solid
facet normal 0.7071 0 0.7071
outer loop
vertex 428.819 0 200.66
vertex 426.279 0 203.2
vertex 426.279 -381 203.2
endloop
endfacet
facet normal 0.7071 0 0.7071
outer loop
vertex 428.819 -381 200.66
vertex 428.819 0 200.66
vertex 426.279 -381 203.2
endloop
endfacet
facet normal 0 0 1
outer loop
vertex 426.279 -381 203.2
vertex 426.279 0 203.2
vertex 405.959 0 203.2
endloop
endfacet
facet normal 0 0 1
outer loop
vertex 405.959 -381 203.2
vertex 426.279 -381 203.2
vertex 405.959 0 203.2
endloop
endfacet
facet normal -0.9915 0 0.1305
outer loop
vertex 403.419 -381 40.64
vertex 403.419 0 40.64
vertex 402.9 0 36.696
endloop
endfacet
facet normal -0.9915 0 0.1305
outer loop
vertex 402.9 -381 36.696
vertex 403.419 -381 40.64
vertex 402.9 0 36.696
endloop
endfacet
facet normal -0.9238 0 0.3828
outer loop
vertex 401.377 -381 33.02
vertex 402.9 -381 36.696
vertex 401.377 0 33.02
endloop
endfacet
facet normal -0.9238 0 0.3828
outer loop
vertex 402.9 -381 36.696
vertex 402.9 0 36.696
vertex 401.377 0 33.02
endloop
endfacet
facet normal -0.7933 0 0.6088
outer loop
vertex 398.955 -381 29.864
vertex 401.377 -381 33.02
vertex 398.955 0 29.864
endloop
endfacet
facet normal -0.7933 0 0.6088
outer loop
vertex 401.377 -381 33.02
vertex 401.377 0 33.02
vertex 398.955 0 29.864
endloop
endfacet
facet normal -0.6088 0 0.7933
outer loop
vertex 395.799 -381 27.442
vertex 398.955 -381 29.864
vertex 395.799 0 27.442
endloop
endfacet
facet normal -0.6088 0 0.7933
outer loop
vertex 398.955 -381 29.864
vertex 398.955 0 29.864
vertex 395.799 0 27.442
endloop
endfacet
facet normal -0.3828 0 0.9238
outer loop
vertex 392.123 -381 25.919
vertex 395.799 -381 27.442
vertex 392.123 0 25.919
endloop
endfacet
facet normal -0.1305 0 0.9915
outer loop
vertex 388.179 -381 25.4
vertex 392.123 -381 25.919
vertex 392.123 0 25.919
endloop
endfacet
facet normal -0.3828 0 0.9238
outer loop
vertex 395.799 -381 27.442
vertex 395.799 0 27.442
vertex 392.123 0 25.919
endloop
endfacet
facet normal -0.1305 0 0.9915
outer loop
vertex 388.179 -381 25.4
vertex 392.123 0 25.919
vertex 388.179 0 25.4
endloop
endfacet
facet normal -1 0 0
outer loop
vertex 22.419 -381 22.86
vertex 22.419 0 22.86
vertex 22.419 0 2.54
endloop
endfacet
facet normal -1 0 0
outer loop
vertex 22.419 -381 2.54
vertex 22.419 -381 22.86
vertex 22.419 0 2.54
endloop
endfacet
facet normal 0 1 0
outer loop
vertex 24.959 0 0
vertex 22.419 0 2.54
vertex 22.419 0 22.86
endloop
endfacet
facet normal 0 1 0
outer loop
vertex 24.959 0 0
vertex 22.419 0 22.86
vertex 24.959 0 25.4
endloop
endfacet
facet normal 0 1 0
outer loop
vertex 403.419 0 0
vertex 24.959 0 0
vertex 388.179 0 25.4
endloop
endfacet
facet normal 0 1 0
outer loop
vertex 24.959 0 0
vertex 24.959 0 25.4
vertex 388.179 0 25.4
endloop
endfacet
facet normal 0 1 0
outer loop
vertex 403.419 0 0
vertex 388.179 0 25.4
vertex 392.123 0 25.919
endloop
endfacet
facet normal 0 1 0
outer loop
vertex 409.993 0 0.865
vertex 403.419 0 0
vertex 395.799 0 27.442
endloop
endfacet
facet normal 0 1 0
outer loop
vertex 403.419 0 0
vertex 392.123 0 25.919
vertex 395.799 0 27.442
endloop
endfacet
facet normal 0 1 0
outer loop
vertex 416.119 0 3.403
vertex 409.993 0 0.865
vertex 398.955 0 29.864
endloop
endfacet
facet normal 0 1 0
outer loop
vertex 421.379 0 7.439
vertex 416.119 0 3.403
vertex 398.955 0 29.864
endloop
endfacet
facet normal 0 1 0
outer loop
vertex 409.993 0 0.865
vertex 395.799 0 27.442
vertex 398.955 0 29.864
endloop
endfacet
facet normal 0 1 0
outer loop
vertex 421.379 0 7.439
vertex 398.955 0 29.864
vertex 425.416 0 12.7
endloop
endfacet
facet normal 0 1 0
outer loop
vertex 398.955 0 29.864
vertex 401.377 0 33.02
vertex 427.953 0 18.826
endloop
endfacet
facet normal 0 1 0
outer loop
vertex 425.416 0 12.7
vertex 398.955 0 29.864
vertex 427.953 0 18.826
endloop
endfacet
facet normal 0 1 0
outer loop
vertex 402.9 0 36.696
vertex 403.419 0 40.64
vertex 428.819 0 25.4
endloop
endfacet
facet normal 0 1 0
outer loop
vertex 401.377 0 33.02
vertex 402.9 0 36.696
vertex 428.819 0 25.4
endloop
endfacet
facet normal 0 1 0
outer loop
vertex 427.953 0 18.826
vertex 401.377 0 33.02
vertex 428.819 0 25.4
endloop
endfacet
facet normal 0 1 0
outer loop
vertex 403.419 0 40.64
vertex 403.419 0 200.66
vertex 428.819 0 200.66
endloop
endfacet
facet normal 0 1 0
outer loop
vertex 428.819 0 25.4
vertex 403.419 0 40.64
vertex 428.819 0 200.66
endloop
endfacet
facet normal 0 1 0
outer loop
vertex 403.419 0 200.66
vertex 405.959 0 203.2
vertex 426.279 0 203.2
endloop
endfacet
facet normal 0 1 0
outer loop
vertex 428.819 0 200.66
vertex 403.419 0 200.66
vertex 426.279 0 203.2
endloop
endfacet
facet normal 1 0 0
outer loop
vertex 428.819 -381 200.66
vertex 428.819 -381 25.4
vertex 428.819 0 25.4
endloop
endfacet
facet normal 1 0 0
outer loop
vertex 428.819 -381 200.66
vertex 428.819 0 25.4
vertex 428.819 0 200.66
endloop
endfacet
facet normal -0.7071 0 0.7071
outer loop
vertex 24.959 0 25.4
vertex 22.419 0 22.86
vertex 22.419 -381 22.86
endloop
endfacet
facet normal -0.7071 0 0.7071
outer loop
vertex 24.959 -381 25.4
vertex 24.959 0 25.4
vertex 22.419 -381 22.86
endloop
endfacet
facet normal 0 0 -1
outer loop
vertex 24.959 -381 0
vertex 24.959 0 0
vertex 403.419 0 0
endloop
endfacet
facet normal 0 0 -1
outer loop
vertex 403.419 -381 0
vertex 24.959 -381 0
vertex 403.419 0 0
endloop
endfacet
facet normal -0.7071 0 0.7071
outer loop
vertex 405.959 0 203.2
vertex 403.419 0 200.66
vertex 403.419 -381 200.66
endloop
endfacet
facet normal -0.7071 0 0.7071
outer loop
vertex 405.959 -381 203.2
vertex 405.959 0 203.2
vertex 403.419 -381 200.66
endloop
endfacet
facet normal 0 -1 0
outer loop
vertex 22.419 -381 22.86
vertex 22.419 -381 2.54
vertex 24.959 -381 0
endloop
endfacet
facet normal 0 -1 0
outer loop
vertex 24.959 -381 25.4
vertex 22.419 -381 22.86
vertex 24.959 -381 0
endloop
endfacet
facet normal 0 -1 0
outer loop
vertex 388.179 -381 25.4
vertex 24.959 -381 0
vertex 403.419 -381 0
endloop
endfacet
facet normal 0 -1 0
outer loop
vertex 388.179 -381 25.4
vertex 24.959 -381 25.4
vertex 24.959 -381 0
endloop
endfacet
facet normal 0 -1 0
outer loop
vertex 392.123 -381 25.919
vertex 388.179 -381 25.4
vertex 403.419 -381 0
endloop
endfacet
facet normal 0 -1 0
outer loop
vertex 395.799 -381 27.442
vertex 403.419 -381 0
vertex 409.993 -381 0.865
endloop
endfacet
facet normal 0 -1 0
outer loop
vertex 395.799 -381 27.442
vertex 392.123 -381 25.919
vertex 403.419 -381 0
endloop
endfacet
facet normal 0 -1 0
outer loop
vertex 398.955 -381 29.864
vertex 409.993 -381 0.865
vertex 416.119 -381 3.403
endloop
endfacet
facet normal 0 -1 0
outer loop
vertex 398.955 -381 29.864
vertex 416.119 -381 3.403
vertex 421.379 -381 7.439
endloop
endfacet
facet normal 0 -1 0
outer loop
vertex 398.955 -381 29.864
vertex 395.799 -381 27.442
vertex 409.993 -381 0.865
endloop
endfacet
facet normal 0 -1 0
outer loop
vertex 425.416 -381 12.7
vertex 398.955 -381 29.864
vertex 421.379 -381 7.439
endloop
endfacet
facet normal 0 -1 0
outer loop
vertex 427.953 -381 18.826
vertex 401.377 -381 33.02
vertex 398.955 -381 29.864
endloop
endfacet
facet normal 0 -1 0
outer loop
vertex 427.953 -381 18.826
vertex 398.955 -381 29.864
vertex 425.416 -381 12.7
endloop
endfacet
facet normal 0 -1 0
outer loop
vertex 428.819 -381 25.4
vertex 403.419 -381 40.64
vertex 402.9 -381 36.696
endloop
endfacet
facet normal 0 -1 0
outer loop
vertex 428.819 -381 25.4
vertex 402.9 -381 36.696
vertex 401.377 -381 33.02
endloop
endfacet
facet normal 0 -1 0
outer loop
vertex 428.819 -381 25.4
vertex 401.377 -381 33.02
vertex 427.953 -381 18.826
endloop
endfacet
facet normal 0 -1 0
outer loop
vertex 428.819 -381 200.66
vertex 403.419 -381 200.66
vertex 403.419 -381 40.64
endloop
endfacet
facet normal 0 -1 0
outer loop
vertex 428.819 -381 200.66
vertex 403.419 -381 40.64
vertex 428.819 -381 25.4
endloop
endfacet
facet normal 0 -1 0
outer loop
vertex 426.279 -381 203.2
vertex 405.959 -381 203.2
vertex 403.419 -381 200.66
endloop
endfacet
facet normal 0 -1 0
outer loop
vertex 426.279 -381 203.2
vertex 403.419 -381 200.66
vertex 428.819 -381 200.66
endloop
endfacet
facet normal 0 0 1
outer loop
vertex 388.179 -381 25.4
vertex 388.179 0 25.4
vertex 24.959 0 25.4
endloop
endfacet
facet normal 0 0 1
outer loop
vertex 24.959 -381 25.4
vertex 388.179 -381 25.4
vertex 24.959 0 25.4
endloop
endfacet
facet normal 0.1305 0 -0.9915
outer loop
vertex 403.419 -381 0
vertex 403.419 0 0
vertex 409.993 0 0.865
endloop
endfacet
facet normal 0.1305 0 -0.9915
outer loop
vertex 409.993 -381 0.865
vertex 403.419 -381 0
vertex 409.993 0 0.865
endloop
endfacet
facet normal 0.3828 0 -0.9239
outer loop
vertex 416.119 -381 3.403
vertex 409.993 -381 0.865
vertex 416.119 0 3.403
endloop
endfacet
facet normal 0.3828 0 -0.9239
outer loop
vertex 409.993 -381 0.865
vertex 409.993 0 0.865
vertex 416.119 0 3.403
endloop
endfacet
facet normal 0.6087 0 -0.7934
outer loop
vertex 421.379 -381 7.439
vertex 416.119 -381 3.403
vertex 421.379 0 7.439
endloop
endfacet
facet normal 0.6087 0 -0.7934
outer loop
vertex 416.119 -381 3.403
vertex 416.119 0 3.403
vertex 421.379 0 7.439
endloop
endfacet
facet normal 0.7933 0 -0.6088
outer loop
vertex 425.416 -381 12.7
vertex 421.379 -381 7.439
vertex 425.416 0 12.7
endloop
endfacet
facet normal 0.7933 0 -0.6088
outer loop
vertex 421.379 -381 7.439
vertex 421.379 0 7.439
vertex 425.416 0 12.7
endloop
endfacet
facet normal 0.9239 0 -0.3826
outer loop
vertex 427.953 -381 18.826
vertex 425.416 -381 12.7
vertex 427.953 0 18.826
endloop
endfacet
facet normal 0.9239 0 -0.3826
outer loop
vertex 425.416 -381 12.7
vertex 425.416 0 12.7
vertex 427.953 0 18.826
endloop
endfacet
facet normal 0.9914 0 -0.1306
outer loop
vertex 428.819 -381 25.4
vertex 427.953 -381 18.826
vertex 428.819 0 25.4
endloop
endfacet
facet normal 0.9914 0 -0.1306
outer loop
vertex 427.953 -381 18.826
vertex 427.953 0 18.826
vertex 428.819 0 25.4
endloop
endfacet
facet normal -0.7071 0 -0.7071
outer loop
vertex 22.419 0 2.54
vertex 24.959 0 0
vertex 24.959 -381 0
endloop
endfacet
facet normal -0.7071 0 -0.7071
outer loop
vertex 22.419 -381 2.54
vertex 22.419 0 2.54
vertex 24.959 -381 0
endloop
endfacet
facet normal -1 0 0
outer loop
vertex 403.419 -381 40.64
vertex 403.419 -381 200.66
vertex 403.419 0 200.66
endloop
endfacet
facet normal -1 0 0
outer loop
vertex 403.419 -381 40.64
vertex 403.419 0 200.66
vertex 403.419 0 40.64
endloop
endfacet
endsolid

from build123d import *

# Parameters (mm, degrees)
F1_DEPTH = 381
F2_SIZE  = 2.54


with BuildPart() as f1:
    # F0 (on Front) → F1 (new body)
    with BuildSketch(Plane.XZ):
        with BuildLine():
            Line((388.178844, 25.4), (22.418844, 25.4))
            Line((22.418844, 25.4), (22.418844, 0))
            Line((22.418844, 0), (403.418844, 0))
            ThreePointArc((403.418844, 0), (421.379356, 7.439488), (428.818844, 25.4))
            Line((428.818844, 25.4), (428.818844, 203.2))
            Line((428.818844, 203.2), (403.418844, 203.2))
            Line((403.418844, 203.2), (403.418844, 40.64))
            ThreePointArc((403.418844, 40.64), (398.955151, 29.863693), (388.178844, 25.4))
        make_face()
    extrude(amount=F1_DEPTH)

    # F2
    f2_edges = [f1.edges().sort_by_distance(p)[0] for p in [
        (22.418844, -190.5, 0),
        (22.418844, -190.5, 25.4),
        (428.818844, -190.5, 203.2),
        (403.418844, -190.5, 203.2),
    ]]
    chamfer(f2_edges, length=F2_SIZE)


solid = f1.part
